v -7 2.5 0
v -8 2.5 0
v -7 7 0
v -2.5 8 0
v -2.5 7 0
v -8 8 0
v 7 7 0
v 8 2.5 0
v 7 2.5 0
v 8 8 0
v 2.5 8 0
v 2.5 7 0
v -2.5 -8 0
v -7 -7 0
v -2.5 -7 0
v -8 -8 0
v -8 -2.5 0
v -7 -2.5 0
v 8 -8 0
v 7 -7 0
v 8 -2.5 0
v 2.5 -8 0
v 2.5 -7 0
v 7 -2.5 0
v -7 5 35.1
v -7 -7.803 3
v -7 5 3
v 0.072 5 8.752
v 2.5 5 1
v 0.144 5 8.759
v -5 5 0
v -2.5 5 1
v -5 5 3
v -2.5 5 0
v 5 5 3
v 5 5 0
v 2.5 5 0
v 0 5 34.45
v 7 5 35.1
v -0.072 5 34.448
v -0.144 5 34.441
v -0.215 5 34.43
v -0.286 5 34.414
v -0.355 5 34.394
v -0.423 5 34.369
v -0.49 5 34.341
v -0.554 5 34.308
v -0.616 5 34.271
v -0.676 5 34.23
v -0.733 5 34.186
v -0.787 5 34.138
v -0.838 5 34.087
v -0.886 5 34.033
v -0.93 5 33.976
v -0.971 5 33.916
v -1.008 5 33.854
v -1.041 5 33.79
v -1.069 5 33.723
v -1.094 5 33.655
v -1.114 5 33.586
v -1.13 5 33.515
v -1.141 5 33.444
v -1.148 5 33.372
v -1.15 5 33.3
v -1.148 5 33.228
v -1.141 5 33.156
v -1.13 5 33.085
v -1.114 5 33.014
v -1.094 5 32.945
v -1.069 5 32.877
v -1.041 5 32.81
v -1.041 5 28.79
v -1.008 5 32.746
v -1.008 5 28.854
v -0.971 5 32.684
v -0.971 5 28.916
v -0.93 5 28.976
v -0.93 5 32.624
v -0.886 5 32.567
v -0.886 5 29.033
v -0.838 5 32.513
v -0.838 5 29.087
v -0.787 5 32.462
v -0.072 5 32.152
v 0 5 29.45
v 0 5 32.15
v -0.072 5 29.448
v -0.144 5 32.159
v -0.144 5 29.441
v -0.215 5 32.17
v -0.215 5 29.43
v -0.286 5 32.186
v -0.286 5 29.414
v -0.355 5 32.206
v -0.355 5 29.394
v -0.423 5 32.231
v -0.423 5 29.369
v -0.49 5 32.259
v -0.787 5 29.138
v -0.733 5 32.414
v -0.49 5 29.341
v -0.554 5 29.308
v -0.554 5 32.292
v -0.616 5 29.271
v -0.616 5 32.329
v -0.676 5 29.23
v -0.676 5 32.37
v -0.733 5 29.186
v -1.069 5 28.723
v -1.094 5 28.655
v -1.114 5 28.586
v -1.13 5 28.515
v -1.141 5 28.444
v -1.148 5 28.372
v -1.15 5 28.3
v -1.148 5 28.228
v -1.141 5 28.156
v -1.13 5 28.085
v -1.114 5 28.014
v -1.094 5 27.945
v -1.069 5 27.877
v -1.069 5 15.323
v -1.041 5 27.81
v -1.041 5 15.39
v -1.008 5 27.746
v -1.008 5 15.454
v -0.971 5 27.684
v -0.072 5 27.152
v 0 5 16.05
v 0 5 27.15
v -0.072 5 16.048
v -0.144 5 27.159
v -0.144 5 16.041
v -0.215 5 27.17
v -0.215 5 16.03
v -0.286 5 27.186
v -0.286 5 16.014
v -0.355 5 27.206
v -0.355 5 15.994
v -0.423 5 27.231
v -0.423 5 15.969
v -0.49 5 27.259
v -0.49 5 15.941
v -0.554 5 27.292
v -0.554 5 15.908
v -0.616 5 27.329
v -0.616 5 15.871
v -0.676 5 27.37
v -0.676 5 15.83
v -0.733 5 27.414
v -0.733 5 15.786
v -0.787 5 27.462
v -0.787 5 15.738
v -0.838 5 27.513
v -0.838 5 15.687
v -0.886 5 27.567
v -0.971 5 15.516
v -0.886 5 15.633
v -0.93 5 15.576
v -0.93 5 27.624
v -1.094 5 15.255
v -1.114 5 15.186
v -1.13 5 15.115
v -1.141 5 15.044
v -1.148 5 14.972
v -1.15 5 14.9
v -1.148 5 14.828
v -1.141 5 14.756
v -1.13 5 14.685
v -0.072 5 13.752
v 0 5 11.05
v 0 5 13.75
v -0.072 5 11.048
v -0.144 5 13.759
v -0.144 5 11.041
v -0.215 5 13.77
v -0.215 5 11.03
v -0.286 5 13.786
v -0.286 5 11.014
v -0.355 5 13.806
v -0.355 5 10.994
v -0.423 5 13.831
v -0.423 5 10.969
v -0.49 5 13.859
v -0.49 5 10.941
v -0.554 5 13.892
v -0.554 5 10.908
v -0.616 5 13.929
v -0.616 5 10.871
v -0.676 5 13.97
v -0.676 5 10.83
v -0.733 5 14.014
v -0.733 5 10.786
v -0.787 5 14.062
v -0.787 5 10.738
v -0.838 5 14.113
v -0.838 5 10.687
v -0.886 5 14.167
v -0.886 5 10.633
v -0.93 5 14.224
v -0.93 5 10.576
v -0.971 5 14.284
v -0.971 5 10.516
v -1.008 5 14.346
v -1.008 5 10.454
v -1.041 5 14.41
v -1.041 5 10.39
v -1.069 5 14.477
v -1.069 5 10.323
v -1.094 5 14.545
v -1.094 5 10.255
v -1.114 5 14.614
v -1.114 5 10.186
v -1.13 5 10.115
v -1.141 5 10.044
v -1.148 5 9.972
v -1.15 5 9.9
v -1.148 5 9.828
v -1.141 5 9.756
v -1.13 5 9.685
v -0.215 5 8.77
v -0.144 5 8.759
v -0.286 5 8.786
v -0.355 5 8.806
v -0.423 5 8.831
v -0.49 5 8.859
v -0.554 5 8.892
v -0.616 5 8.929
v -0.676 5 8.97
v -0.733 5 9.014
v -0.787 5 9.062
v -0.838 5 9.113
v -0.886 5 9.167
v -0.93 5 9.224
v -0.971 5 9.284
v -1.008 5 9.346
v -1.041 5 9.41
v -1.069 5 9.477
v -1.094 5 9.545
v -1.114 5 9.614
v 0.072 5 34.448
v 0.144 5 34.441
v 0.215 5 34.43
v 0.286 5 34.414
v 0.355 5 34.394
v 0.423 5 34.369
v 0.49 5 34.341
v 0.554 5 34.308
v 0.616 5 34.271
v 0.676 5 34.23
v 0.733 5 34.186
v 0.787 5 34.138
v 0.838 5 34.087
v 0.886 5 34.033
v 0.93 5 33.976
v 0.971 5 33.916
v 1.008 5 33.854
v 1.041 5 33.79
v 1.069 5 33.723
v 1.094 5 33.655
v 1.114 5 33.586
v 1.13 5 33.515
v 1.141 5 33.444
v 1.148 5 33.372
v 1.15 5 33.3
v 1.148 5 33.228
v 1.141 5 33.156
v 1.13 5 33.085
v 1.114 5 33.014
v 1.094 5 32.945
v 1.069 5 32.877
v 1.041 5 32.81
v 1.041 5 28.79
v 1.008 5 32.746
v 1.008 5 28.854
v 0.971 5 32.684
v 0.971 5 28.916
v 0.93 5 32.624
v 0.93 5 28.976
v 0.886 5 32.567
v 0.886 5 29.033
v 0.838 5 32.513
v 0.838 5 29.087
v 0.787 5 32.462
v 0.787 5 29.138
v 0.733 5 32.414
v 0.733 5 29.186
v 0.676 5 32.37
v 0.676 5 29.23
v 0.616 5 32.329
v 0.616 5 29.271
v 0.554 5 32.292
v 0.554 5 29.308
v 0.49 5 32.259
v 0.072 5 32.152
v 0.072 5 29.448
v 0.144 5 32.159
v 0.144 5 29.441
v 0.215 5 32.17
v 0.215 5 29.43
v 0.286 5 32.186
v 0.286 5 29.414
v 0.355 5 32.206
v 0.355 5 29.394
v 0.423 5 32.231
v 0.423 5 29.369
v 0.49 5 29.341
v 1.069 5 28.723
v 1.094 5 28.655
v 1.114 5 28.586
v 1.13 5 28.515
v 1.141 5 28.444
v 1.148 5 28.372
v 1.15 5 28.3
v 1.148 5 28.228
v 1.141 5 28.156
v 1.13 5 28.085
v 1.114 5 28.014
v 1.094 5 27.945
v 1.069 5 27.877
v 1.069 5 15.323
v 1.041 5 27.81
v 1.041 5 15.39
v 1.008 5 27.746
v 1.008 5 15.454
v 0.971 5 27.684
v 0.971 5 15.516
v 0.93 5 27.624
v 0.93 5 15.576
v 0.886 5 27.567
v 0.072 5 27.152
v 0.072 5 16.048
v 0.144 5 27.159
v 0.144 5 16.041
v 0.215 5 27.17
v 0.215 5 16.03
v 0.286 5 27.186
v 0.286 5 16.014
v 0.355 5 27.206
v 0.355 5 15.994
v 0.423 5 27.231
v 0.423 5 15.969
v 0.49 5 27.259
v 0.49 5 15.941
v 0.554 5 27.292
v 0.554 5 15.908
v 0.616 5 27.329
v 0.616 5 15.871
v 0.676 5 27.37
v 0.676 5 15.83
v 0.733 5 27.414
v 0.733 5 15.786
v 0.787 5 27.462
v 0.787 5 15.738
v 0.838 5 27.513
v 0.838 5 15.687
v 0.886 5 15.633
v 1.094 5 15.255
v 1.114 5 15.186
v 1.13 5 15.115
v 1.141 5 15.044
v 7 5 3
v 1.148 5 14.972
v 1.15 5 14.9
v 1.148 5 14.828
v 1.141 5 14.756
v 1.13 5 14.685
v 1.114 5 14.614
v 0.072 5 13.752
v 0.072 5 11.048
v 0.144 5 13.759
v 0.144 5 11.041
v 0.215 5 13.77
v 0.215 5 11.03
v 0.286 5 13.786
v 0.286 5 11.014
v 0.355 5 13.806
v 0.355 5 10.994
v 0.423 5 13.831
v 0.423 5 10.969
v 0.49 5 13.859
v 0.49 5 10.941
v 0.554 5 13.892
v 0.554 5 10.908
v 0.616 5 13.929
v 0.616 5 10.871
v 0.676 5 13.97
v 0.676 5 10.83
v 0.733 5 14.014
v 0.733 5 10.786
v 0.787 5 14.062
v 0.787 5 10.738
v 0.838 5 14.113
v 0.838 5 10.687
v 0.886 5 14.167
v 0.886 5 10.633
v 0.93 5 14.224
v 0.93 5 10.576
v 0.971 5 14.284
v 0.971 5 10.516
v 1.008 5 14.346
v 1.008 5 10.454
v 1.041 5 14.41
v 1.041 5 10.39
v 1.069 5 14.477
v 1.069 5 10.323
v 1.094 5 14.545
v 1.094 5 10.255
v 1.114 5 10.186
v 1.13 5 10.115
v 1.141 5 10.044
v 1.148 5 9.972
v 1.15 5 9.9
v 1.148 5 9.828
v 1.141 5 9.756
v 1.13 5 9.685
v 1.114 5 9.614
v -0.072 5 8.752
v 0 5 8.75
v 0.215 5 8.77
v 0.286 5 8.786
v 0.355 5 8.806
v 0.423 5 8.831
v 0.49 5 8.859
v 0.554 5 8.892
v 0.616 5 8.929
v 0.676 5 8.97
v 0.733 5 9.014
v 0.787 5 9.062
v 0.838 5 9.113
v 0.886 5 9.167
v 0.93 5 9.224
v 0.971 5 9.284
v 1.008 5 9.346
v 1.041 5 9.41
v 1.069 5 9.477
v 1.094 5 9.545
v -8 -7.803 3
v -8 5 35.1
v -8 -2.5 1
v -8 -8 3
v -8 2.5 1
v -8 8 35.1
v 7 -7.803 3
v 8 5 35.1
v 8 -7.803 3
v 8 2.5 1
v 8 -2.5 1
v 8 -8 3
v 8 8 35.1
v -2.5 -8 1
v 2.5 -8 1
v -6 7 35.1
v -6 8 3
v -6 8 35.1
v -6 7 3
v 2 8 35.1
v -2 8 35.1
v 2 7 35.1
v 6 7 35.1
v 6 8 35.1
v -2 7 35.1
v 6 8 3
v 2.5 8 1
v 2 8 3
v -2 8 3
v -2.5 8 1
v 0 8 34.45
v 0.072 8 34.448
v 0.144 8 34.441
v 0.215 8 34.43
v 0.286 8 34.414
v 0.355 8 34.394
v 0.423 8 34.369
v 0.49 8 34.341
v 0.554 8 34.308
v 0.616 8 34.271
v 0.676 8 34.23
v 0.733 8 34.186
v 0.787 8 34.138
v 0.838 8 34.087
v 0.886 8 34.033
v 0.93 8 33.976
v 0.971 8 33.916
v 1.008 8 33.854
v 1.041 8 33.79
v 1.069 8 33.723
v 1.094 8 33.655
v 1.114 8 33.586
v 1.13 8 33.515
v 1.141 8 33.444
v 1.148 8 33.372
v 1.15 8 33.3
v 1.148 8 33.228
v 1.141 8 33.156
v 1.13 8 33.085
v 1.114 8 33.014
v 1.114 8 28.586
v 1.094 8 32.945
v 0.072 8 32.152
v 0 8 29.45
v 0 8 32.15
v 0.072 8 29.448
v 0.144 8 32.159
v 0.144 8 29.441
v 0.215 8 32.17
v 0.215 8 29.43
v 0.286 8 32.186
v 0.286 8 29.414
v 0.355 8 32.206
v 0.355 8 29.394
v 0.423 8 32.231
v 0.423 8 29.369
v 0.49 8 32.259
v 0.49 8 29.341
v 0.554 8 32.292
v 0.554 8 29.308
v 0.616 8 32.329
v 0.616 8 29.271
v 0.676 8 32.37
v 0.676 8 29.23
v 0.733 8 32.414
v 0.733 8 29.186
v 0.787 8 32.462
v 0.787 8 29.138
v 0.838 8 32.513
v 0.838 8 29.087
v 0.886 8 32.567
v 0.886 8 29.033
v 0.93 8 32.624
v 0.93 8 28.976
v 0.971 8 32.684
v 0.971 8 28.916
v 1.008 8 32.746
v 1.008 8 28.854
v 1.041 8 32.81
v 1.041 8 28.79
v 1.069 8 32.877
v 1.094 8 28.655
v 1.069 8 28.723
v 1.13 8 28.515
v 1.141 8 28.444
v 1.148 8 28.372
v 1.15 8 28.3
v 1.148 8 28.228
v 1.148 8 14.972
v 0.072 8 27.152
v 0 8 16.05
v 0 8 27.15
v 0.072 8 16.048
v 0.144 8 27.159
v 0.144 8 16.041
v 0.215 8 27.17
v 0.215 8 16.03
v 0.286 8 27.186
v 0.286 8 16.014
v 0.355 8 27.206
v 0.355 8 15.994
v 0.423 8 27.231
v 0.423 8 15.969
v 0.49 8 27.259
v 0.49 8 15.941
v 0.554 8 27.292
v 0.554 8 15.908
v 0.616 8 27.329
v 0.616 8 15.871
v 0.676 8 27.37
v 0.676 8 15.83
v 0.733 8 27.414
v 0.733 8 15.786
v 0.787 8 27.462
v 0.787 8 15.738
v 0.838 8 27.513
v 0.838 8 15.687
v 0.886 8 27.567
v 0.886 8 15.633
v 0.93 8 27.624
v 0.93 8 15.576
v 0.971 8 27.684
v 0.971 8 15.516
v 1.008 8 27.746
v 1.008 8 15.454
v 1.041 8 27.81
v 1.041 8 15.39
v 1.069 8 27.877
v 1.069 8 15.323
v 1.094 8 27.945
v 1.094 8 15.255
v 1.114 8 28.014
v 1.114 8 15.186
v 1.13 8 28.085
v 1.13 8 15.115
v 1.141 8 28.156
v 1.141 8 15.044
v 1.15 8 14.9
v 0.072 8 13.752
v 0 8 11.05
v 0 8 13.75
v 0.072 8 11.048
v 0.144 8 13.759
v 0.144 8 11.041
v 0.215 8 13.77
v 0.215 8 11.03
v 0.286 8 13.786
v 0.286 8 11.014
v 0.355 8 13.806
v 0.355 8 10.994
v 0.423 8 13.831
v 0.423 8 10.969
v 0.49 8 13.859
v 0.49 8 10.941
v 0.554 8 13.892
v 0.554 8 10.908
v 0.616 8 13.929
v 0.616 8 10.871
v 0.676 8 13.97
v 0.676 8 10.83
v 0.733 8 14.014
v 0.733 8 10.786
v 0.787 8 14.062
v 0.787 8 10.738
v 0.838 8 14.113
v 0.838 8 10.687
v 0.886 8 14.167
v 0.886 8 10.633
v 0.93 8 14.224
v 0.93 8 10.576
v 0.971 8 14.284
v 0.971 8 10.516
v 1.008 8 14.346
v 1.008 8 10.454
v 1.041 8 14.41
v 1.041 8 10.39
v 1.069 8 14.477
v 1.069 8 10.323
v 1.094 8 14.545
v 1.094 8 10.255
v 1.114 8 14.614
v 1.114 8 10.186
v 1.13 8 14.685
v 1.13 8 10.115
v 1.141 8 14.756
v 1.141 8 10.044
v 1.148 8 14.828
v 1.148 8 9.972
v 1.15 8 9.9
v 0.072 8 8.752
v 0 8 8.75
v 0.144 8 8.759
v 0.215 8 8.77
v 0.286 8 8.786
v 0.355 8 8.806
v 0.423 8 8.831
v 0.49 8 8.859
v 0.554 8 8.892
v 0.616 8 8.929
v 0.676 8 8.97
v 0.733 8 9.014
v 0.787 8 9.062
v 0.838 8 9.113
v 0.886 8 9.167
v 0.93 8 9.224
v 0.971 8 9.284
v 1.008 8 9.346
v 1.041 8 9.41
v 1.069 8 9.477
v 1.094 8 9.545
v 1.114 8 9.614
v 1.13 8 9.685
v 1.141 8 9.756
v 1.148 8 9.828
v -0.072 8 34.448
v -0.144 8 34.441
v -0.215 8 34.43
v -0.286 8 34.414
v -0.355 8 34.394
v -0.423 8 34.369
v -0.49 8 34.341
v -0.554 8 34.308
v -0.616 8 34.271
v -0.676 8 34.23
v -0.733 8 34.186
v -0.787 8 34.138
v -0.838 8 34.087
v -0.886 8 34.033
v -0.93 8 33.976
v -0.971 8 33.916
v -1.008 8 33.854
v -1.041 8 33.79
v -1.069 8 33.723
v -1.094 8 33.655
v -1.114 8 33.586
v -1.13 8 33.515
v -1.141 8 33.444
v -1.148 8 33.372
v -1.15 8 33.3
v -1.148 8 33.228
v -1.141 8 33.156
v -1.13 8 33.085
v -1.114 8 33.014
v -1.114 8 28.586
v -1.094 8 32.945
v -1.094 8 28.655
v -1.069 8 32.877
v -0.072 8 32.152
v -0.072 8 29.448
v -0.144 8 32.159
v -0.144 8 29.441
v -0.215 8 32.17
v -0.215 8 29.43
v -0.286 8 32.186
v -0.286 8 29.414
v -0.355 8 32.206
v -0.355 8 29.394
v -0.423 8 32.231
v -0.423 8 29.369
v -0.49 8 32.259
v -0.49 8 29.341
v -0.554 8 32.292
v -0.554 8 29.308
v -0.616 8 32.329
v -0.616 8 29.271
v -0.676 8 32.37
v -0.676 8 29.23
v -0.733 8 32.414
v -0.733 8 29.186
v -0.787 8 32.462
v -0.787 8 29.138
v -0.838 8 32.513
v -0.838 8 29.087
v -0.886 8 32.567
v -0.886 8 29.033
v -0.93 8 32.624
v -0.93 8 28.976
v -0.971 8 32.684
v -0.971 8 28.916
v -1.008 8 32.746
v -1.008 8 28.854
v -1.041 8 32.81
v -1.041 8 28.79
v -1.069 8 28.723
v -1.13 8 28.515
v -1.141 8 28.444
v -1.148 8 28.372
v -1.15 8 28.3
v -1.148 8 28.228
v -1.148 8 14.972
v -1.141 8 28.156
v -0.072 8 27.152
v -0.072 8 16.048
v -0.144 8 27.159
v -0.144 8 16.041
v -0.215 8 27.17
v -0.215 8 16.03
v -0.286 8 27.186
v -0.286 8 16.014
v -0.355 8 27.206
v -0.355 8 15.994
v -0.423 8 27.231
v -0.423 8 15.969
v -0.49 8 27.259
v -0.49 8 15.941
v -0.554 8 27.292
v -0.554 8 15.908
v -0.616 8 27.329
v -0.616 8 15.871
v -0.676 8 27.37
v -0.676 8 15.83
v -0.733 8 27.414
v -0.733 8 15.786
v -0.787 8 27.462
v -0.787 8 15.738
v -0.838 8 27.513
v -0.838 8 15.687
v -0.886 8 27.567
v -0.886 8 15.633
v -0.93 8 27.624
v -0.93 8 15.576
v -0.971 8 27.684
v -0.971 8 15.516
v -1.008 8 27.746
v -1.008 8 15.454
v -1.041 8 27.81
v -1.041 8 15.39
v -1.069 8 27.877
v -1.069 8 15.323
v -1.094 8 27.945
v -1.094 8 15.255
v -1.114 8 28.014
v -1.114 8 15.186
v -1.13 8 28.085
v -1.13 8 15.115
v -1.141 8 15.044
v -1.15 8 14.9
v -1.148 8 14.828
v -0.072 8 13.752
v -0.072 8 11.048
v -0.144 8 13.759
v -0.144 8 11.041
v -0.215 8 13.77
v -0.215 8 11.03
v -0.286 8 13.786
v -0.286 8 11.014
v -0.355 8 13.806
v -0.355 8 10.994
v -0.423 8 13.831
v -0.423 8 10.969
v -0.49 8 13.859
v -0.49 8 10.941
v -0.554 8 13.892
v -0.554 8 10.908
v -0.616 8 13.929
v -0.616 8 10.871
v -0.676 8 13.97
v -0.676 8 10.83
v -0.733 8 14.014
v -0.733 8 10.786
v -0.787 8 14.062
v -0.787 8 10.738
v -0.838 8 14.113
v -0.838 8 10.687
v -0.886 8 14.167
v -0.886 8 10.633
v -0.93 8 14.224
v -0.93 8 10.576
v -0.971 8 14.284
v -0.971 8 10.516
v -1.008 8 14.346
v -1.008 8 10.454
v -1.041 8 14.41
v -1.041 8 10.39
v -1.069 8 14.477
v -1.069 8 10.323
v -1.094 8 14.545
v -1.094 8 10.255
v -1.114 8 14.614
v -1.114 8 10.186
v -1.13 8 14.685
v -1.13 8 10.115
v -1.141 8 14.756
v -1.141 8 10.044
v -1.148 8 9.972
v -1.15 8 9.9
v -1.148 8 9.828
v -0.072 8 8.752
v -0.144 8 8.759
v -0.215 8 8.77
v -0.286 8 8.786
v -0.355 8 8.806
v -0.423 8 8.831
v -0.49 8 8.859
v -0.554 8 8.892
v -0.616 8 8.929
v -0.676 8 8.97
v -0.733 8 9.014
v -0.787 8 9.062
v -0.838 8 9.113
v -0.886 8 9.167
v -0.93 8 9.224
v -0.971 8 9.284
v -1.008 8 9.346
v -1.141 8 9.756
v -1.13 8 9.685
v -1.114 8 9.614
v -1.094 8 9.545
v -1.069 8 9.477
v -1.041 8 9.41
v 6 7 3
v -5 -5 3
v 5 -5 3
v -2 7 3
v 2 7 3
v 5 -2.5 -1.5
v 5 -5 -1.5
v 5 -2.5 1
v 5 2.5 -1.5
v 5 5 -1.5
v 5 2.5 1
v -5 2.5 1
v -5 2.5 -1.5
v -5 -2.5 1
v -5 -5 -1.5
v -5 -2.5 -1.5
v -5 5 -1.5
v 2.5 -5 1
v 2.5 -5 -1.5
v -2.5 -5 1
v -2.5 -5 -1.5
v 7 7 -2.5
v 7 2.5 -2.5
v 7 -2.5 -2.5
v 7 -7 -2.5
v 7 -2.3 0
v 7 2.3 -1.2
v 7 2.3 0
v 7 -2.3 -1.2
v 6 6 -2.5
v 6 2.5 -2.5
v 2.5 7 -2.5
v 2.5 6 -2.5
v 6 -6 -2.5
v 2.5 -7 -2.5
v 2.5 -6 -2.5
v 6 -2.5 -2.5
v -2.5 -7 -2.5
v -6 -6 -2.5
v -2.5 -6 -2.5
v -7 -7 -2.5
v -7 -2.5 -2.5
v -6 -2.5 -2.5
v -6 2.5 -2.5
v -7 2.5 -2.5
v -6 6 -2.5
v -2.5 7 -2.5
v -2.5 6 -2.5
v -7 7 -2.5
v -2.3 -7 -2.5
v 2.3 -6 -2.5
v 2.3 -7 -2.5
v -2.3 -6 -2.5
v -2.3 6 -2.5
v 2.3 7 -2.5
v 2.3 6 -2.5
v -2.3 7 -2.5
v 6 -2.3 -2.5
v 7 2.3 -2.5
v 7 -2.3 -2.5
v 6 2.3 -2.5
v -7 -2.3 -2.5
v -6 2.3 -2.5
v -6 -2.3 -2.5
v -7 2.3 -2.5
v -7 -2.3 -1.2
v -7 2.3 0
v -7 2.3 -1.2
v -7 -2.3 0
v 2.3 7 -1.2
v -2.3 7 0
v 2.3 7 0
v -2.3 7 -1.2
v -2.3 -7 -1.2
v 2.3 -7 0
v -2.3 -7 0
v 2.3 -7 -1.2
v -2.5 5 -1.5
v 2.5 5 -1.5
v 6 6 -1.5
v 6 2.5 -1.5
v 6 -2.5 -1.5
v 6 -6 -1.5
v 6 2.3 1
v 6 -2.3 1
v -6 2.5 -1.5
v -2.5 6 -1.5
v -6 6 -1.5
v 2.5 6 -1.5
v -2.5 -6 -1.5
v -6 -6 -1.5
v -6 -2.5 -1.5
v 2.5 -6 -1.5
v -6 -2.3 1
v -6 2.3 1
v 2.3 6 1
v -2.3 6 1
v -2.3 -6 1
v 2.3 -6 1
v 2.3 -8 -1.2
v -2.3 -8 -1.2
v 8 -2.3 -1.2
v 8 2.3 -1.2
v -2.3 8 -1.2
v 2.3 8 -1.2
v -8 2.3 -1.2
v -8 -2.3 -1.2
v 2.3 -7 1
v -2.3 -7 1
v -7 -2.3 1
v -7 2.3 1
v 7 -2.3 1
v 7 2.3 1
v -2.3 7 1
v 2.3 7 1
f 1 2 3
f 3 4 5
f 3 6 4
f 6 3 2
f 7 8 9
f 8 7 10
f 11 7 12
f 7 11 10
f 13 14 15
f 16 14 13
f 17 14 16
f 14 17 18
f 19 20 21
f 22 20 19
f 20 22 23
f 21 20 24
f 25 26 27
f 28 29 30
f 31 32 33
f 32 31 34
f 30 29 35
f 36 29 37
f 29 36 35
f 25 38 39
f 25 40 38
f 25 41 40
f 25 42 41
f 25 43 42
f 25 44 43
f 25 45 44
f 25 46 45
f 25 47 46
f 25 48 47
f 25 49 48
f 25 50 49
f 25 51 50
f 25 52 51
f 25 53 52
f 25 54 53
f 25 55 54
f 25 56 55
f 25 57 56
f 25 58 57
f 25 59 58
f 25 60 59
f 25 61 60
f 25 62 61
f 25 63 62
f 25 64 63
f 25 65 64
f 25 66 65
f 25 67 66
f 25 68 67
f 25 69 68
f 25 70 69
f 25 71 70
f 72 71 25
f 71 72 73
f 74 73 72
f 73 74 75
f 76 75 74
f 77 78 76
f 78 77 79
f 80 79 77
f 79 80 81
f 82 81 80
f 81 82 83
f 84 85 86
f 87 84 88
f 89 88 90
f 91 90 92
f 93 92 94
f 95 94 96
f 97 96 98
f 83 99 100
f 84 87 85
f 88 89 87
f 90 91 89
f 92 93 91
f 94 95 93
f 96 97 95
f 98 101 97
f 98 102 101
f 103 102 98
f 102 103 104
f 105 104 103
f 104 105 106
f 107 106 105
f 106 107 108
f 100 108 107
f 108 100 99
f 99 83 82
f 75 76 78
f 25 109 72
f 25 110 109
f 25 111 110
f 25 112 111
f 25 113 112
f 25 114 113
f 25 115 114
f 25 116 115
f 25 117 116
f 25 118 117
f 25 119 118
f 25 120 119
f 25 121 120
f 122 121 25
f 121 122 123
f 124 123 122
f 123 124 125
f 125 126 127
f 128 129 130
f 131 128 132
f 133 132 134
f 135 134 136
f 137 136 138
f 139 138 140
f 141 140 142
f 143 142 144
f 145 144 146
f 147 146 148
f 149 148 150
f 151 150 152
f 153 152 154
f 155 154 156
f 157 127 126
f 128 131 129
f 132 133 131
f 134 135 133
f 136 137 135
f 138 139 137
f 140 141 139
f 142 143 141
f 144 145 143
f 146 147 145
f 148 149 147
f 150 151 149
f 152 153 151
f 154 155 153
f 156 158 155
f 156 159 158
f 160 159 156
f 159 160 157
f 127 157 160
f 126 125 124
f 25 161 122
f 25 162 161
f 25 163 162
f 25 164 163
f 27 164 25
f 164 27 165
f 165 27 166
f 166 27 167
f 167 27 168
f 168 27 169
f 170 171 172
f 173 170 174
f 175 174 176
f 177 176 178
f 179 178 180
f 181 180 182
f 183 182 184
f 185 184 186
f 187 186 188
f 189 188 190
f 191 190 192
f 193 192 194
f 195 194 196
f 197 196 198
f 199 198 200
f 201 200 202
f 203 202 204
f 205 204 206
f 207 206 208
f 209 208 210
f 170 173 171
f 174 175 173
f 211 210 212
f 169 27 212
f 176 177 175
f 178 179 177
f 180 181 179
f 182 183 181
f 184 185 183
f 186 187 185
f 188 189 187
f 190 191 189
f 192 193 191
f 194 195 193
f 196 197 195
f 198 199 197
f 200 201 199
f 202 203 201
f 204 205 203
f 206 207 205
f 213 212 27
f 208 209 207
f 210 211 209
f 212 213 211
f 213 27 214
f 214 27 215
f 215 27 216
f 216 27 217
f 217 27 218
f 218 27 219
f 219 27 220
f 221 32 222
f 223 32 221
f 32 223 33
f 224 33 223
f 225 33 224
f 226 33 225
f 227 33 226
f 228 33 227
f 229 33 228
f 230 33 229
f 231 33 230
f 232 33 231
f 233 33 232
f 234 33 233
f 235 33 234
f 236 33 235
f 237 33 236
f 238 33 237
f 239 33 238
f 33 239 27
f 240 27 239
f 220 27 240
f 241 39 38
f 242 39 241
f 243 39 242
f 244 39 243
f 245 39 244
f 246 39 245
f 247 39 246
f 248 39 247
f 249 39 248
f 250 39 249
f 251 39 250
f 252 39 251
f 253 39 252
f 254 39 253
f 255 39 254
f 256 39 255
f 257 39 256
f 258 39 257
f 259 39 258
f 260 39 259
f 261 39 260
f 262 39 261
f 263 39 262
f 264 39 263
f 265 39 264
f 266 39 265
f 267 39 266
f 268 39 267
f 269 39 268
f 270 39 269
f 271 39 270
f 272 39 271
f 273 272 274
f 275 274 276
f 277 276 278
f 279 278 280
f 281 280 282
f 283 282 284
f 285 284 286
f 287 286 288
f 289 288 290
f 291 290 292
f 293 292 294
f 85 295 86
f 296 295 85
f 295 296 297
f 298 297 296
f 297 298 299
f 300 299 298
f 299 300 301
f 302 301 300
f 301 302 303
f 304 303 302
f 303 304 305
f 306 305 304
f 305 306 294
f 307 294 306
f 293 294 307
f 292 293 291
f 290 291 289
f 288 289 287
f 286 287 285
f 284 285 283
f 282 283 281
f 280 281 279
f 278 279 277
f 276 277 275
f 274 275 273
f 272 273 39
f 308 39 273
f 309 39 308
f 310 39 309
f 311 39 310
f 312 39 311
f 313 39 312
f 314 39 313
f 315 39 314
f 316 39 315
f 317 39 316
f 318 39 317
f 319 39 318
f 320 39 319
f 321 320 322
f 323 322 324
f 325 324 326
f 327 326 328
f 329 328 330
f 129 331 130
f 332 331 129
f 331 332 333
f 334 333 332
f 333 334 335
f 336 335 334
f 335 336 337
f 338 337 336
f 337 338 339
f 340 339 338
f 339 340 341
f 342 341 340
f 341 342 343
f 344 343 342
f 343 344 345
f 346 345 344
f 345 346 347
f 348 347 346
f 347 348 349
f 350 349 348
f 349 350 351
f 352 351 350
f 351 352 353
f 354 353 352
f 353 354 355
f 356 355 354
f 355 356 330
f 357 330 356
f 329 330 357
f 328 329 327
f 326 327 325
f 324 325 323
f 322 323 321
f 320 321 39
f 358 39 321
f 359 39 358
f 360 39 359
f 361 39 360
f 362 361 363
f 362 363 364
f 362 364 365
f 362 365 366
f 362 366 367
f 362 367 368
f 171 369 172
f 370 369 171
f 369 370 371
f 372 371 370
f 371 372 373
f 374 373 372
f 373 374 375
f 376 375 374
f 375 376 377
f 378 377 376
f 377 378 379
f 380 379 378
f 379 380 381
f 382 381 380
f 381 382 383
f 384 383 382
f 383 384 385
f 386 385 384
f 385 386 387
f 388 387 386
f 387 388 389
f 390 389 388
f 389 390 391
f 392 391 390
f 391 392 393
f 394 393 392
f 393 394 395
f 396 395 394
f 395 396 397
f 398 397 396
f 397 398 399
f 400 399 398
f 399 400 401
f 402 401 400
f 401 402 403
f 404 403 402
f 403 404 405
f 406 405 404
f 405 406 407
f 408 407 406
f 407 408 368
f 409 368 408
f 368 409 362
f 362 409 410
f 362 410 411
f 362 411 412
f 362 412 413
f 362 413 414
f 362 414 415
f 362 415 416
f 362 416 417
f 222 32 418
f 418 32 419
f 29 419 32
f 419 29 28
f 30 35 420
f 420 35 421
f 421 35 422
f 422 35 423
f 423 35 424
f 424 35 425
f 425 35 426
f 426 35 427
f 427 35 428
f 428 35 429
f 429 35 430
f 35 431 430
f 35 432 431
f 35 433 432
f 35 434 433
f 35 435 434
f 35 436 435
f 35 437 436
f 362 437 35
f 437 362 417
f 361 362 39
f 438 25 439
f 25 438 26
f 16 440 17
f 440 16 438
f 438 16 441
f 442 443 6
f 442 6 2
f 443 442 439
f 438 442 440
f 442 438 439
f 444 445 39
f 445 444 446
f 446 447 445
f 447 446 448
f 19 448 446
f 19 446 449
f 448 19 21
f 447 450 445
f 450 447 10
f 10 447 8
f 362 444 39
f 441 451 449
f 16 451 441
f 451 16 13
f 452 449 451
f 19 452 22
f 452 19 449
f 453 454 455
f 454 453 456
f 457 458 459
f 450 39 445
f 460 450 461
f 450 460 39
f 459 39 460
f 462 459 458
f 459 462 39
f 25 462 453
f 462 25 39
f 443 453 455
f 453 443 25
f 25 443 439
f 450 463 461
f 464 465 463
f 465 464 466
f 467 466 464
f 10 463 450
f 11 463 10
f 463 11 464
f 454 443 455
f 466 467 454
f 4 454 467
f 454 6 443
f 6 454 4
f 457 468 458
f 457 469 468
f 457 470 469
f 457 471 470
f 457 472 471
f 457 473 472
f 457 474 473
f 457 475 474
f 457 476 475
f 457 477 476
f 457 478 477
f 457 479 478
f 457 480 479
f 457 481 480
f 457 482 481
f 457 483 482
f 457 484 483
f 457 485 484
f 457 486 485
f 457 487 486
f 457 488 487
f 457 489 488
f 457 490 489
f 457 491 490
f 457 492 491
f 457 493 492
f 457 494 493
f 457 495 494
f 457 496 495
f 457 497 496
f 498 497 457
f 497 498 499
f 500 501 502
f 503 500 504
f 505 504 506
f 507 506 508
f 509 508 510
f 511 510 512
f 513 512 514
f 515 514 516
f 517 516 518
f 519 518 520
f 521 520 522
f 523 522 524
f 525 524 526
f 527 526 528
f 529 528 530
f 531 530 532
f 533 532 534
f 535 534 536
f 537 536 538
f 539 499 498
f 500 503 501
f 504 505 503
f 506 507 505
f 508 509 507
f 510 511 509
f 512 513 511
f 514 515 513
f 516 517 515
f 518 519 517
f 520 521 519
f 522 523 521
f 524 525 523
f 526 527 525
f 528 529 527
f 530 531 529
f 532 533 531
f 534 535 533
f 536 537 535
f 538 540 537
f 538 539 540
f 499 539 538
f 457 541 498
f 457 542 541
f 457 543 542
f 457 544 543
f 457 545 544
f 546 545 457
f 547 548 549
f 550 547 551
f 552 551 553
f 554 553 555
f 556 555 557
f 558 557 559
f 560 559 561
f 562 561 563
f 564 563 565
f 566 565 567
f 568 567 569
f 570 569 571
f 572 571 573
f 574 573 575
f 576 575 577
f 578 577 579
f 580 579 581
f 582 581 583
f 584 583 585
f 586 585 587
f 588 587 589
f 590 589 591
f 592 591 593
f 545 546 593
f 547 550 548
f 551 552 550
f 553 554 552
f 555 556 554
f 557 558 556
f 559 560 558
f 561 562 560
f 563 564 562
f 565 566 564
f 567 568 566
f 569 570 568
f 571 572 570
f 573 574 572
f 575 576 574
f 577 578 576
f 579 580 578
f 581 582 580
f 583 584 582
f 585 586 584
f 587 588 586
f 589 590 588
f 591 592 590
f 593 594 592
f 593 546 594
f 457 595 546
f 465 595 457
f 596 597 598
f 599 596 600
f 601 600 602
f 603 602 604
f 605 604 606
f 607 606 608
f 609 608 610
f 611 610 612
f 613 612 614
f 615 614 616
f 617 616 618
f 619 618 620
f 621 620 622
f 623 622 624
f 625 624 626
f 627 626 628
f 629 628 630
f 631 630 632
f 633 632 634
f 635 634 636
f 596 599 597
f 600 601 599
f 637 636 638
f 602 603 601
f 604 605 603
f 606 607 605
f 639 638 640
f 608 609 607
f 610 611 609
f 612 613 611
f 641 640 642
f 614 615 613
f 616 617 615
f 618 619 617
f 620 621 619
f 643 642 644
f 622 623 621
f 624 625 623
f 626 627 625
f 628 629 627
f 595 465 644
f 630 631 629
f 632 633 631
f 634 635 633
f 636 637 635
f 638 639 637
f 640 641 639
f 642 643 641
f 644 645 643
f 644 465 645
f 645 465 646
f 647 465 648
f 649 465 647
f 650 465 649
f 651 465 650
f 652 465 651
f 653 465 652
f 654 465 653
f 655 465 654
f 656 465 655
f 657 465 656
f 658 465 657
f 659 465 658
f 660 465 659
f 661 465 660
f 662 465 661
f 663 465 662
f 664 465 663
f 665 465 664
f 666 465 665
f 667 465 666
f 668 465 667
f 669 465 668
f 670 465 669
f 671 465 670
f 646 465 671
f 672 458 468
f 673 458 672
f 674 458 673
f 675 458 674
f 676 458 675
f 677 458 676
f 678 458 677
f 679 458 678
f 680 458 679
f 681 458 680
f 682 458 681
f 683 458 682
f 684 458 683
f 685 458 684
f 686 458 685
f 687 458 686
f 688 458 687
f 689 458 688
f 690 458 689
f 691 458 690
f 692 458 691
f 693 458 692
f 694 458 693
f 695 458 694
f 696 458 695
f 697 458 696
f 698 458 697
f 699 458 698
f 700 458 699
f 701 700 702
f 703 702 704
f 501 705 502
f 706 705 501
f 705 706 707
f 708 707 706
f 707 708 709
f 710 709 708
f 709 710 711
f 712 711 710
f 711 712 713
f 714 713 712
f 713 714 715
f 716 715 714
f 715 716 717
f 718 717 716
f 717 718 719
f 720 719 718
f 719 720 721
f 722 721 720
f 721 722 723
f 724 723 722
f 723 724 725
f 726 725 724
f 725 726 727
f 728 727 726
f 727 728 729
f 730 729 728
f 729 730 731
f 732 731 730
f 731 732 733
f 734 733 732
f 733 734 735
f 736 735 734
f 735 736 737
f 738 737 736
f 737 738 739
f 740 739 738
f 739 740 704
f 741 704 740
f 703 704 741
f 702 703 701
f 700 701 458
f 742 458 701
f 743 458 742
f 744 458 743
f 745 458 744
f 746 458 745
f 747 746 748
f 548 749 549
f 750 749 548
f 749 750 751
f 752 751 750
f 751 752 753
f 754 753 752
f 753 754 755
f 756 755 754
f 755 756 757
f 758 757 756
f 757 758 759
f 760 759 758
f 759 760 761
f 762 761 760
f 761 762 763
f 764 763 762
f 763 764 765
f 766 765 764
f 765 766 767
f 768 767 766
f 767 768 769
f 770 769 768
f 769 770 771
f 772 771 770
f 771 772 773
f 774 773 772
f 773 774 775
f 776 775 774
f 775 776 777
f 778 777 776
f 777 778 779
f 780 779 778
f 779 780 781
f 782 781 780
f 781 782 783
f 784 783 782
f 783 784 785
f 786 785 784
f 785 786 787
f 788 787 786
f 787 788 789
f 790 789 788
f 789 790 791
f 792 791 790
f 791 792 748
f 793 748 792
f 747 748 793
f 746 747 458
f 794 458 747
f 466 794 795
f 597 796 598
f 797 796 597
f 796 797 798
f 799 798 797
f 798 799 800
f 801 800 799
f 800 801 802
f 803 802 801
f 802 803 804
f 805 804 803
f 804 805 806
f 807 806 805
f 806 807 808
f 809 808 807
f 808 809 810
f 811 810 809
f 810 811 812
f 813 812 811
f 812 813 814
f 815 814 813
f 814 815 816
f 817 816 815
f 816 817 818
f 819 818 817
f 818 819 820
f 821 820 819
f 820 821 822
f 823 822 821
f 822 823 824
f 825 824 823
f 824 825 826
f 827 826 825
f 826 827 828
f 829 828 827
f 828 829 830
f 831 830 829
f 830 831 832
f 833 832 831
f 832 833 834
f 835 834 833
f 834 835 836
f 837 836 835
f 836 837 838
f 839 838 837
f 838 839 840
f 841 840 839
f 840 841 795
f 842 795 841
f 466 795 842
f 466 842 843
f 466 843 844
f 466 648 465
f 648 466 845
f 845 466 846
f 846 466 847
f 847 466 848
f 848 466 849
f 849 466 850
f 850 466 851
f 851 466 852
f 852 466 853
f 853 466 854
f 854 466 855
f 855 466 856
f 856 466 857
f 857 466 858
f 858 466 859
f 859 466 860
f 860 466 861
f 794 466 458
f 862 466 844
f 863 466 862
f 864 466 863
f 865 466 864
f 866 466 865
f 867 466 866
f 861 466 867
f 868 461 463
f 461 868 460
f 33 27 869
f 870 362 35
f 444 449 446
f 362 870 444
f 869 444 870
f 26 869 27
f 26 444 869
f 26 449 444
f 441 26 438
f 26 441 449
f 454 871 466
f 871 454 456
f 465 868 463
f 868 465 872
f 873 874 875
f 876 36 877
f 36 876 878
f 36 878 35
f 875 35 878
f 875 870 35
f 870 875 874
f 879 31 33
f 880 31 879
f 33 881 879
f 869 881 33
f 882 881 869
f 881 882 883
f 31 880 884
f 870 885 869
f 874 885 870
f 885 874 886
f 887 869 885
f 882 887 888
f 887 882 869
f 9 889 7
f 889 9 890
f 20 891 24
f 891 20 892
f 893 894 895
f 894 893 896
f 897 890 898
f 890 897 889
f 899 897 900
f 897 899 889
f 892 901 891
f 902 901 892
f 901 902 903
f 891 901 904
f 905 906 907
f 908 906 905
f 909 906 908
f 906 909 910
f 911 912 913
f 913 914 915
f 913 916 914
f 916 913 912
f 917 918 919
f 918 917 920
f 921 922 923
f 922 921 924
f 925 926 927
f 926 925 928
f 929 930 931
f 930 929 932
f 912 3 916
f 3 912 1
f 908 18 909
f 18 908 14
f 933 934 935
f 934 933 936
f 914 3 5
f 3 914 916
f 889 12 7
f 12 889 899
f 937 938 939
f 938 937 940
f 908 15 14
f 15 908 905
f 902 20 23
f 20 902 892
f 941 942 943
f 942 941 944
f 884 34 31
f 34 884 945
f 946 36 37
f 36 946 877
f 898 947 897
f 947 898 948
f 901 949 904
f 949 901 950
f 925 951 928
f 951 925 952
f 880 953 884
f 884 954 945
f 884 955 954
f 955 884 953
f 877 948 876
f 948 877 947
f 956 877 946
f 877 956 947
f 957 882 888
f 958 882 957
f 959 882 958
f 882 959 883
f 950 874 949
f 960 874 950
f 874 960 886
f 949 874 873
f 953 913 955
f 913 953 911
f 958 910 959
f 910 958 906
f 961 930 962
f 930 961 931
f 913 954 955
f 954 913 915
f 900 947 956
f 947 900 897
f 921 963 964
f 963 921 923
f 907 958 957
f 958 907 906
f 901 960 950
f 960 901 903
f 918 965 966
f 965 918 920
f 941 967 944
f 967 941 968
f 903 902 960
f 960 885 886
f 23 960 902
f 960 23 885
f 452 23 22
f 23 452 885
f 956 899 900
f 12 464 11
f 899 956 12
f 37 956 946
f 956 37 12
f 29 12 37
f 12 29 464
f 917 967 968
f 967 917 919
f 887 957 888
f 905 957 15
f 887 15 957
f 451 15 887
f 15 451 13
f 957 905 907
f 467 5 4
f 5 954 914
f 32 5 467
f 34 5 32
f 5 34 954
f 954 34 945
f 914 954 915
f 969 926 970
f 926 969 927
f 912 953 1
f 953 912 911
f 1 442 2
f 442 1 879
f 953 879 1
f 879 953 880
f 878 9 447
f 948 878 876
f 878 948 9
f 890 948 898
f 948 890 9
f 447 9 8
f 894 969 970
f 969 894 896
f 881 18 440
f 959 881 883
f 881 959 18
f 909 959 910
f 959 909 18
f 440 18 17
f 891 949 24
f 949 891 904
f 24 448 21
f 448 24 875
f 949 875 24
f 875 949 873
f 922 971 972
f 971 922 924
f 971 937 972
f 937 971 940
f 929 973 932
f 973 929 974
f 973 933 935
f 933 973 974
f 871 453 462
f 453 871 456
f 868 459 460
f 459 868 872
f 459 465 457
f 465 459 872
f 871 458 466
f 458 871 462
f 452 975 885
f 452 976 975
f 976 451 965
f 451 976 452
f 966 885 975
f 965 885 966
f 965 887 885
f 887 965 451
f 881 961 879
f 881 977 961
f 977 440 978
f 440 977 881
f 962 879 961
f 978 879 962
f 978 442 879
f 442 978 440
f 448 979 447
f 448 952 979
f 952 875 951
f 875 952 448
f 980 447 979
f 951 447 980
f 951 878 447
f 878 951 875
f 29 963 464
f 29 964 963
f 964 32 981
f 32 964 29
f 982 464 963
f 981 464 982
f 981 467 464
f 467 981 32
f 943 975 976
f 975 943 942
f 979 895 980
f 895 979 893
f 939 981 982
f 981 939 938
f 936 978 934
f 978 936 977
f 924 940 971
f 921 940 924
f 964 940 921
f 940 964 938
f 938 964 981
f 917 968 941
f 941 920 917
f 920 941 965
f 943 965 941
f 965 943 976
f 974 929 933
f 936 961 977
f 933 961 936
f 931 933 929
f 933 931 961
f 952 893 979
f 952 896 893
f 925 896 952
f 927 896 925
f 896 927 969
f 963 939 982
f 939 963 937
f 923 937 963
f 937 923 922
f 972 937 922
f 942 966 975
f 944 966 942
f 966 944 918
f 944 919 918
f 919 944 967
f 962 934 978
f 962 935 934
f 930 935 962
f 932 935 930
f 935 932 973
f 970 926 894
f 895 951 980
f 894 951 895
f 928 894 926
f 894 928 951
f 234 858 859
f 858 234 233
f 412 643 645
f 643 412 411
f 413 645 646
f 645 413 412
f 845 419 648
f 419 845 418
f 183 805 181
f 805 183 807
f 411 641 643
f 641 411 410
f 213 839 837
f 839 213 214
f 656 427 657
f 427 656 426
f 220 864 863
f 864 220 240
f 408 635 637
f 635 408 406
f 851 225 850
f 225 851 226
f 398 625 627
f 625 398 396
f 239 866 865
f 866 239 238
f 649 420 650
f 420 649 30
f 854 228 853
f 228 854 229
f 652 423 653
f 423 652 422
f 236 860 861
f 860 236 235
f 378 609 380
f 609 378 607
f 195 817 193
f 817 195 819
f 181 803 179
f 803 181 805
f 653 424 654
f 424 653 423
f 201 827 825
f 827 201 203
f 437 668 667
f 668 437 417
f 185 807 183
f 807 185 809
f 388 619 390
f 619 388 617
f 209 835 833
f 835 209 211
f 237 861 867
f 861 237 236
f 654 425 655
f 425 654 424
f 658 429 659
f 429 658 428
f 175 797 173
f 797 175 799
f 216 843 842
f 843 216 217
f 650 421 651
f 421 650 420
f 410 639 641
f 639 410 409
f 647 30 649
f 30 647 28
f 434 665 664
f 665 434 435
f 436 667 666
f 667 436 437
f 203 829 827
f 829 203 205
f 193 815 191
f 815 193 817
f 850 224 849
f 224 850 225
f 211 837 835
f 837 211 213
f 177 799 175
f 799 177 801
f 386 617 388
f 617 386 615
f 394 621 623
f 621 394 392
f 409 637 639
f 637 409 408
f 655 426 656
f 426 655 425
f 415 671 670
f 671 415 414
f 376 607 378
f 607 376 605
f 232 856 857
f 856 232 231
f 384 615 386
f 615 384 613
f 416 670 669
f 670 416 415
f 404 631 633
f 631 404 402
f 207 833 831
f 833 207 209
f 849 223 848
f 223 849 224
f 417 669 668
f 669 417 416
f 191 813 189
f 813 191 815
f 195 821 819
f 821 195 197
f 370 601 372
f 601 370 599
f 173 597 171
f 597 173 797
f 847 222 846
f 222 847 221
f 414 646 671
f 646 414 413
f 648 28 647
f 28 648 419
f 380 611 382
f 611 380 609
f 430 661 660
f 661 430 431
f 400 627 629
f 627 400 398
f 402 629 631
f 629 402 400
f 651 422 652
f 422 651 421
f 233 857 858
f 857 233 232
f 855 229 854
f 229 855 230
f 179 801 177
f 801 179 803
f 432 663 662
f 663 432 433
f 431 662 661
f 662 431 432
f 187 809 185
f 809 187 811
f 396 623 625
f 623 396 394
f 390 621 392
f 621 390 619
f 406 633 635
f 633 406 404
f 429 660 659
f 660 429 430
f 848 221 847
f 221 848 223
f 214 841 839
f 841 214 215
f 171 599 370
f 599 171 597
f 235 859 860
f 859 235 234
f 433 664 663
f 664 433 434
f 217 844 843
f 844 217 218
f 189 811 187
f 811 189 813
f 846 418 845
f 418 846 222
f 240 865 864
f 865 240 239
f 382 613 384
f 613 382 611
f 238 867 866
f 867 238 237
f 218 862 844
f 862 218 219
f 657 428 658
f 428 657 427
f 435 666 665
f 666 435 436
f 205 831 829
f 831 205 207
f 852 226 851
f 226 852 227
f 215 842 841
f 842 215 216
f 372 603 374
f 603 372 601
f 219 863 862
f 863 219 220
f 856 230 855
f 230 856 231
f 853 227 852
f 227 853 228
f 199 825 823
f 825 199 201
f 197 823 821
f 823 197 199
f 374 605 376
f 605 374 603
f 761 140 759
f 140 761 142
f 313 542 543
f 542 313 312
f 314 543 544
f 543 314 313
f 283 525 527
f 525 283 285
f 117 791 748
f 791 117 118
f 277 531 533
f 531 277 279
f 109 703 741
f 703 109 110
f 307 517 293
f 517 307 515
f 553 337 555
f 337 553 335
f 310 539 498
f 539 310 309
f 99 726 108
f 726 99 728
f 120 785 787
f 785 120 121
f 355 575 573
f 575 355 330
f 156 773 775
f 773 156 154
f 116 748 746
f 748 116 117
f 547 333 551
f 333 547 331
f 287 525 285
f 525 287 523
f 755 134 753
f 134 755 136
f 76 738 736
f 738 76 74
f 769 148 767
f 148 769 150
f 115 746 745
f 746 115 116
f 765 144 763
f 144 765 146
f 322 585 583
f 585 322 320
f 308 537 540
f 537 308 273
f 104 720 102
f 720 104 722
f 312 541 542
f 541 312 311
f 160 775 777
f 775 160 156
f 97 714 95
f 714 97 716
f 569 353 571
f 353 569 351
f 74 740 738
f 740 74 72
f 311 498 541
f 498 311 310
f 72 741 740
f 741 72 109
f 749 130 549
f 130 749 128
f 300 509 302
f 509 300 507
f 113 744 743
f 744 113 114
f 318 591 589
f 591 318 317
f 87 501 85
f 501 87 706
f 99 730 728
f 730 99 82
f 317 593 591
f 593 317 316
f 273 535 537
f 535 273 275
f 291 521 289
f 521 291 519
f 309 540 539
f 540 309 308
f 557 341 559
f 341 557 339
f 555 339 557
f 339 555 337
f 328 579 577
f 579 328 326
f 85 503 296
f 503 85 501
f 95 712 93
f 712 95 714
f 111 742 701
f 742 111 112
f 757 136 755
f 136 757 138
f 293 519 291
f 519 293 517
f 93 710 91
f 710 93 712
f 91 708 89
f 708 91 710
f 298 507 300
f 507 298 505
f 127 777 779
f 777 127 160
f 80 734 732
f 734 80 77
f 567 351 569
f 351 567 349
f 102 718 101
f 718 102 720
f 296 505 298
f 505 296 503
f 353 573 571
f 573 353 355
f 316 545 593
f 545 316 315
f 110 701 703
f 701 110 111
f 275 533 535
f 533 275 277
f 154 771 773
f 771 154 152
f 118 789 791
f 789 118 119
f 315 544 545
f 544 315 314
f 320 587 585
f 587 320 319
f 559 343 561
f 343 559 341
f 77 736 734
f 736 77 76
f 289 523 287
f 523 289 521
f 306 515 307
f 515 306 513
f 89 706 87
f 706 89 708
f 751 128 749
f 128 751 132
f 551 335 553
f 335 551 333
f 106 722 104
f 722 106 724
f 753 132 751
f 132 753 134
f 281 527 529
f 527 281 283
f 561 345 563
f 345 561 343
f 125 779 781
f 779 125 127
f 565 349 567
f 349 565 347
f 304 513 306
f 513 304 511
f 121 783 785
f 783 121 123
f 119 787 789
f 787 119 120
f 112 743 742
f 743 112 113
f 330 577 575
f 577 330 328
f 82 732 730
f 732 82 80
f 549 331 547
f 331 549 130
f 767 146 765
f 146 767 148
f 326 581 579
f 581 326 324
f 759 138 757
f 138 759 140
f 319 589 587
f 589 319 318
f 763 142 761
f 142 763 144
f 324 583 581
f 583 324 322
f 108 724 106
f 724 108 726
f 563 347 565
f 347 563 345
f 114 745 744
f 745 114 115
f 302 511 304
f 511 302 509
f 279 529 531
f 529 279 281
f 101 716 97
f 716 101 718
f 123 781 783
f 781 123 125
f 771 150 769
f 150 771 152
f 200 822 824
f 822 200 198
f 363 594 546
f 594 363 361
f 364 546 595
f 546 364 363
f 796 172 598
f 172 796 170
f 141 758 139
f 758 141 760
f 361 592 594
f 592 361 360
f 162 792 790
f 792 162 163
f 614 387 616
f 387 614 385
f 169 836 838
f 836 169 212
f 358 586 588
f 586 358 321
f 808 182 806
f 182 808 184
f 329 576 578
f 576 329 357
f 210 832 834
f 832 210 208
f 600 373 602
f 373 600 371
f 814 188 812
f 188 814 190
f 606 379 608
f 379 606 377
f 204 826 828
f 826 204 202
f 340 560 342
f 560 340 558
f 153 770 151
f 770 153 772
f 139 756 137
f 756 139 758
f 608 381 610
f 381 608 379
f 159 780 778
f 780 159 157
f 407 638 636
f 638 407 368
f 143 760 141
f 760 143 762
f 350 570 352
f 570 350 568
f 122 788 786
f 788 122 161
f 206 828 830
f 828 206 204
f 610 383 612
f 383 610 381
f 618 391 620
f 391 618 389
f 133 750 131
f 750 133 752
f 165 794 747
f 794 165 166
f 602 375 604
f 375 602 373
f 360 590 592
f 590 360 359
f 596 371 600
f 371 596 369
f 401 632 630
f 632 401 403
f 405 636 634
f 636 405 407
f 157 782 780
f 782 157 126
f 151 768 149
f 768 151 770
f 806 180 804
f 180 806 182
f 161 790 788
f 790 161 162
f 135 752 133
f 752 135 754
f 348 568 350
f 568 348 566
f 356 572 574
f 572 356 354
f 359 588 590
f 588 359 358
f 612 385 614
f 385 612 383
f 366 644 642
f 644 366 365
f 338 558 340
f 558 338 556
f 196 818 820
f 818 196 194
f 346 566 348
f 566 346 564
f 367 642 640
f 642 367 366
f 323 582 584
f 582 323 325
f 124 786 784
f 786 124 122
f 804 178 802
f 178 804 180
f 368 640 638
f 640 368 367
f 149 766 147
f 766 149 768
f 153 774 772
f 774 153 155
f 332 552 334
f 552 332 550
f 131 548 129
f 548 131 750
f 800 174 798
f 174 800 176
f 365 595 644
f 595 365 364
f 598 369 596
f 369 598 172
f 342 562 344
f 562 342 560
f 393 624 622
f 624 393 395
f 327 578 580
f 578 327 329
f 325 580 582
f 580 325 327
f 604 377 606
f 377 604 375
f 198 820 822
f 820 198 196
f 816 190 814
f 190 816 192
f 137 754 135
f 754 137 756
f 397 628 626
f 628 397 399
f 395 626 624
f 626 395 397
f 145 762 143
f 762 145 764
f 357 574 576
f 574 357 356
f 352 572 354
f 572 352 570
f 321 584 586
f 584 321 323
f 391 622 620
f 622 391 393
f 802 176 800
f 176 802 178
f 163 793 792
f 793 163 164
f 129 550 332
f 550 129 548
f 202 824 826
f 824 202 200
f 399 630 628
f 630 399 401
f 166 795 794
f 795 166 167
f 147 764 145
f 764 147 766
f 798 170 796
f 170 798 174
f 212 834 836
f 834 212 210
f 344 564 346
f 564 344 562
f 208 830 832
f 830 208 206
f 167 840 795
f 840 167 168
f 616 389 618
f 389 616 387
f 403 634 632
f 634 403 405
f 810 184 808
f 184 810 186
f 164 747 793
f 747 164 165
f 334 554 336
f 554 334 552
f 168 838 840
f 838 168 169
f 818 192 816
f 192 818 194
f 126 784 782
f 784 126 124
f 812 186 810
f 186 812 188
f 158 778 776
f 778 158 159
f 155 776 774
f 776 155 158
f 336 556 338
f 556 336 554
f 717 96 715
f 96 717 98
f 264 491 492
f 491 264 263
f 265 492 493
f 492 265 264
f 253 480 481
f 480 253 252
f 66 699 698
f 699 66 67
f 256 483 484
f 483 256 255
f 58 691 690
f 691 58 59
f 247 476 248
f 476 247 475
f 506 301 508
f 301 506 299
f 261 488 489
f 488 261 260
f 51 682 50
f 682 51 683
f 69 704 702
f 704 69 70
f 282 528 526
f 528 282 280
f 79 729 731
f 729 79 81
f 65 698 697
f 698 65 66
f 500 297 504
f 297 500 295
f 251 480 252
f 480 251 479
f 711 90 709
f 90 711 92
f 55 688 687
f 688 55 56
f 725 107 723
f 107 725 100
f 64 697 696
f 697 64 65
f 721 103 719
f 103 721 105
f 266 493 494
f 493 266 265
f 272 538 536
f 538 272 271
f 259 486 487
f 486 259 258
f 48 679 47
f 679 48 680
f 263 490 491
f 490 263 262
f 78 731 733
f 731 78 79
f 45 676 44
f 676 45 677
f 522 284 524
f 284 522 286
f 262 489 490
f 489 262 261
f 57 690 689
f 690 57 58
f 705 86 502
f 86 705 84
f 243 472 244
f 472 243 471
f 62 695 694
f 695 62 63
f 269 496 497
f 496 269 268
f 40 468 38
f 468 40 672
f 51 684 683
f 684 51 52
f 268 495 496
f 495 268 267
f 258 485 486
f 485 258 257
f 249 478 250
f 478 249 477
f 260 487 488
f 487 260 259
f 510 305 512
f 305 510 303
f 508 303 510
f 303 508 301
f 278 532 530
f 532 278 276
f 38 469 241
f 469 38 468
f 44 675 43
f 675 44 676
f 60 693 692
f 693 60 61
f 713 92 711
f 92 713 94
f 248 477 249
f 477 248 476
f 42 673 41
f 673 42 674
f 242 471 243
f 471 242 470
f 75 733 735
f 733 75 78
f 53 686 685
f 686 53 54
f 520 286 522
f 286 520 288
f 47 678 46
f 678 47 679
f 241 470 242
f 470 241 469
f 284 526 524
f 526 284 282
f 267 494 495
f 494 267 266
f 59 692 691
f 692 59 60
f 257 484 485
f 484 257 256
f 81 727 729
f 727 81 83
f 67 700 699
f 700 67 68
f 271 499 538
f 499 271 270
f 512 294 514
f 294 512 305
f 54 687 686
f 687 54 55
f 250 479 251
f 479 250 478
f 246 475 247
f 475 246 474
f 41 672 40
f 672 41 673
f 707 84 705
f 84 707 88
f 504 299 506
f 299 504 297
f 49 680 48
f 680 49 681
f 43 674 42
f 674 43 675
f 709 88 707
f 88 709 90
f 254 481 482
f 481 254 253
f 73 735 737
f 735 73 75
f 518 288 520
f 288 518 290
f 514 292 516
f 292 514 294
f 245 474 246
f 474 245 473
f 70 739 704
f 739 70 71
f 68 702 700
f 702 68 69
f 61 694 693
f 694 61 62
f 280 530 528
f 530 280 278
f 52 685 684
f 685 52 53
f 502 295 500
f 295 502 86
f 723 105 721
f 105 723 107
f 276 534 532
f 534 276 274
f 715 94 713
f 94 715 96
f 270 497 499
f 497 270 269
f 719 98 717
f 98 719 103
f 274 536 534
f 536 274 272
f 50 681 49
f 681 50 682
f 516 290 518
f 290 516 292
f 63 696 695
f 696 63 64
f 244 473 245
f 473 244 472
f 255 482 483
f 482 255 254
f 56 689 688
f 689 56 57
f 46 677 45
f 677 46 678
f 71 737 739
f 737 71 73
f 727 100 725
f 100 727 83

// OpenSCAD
$fn=100;

sw_x = 14;

sw_out_x = sw_x + 2;
sw_out_z = 3;
sw_out_cutin_x = sw_x - 4;

sw_plate_z = 1.2;
sw_plate_low_z = 2.5;
sw_plate_low_cutin_x = sw_x - 2;
sw_plate_low_cutin_z = 1;

js_y = 2;
js_down_z = 11.85;
js_up_z = 10.25;
js_down_hole_z = 9.95;
js_up_hole_z = 8.45;
js_offset0_z = 5 + 3;
js_offset1_z = js_offset0_z + 5;
js_z = js_offset1_z + js_down_z + js_up_z;
//js_plate_low_z = sw_plate_low_z - sw_plate_low_cutin_z;
js_hole_d = 2.3;

sw_snap_x = 5;
sw_snap_y = 1;
sw_snap_z = sw_plate_low_z - sw_plate_z;

space_x = 17;

//plate_r = 1;
//plate_h = 0.5;

//module plate(x, y, z, r = plate_r) {
//    minkowski() {
//        cube([x - r * 2, y - r * 2, z - plate_h], true);
//        cylinder(h=plate_h, r = r, center=true);
//    }
//}

//%plate(10, 10, 2);

module prism(x, y, z){
  polyhedron(
             points=[[-x/2,0,0], [x/2,0,0], [x/2,0,z], [-x/2,0,z], [-x/2,-y,z], [x/2,-y,z]],
             faces=[[0,1,2,3],[5,4,3,2],[0,4,5,1],[0,3,4],[5,2,1]]
  );
}

//for(i = [0:1]) translate([space_x * i, 0, 0]) 
difference() {
  union() {
    //    joystick mount plate
    translate([0, sw_x / 2 - 1, 0]) {
      difference() {
        translate([0, 0, js_z / 2]) cube([sw_out_x, js_y, js_z], true);
        
        // z hole alps
//        alps_down_hole_z = 8.35;
//        alps_up_hole_z = 7.9;
//        alps_hole_d = 2;
//        alps_hole_space = 2.5;
//        alps_mount_space_x = 12.65 / 2;
//        alps_mount_space_z = 10 / 2;
//        alps_mount_hole_d = 2.5;
//        alps_sw_hole_space_z = 4.5 / 2;
//        alps_sw_hole_space_x = 6.5 / 2;
//        // output pin
//        for(i = [-1:1]) {
//            translate([i * alps_hole_space, 0, js_offset_z + js_down_z + alps_down_hole_z + sw_out_z]) rotate([90, 0, 0]) cylinder(h = js_y, d = alps_hole_d, center = true);
//        }
//        for(i = [-1:1]) {
//            translate([alps_down_hole_z, 0, js_offset_z + js_down_z + sw_out_z + i * alps_hole_space]) rotate([90, 0, 0]) cylinder(h = js_y, d = alps_hole_d, center = true);
//        }
//        // switch pin
//        for(i = [-1,1], j = [-1,1]) { 
//        translate([i * alps_sw_hole_space_x, 0, js_offset_z + js_down_z + sw_out_z + j * alps_sw_hole_space_z - alps_up_hole_z]) rotate([90, 0, 0]) cylinder(h = js_y, d = alps_hole_d, center = true);
//        }
//        // mount pin
//        for(i = [-1,1], j = [-1,1]) { 
//        translate([i * alps_mount_space_x, 0, js_offset_z + js_down_z + sw_out_z + j * alps_mount_space_z]) rotate([90, 0, 0]) cylinder(h = js_y, d = alps_mount_hole_d, center = true);
//        }
      }
    }

    // joystick mount plate font strength
    js_side_y = sw_x;
    js_side_x = (sw_out_x - sw_x) / 2;
    difference() {
        for(i = [-1,1]) translate([i * (sw_x + js_side_x) / 2, -js_side_y / 2 - js_y, 0]) rotate([-90, 0, 0]) prism(js_side_x, js_z, js_side_y); 
        translate([0, -sw_out_x, 0]) cube([sw_out_x, sw_out_x, sw_out_x], true);
    }
    // joystick mount plate back strength
    js_back_y = 2;
    for(i = [-1, 1]) translate([i * sw_x / 2, (sw_out_x - js_back_y) / 2, js_z / 2]) cube([js_back_y, js_back_y, js_z], true);
    translate([0, (sw_out_x - js_back_y) / 2, js_z / 2]) cube([js_back_y * 2, js_back_y , js_z], true);

    
    //    z plate upper
    translate([0, 0, sw_out_z / 2]) difference() {
      cube([sw_out_x, sw_out_x, sw_out_z], true);
      cube([sw_out_cutin_x, sw_out_cutin_x, sw_out_z], true);
    }
    
    //    z plate, plate lower
    translate([0, 0, -sw_plate_low_z / 2]) difference() {
      cube([sw_x, sw_x, sw_plate_low_z], true);
      cube([sw_out_cutin_x, sw_out_cutin_x, sw_plate_low_z], true);
      translate([0, 0, sw_plate_low_cutin_z / 2 -sw_plate_low_z / 2]) cube([sw_plate_low_cutin_x, sw_plate_low_cutin_x, sw_plate_low_cutin_z], true);
    }

    // snap
    for(i = [0:4]) {
      rotate([0, 0, 90 * i]) translate([0, -sw_x / 2, -sw_snap_z - sw_plate_z]) prism(sw_snap_x, sw_snap_y, sw_snap_z);
    }
  }

  // plate upper snap cut
  sw_plate_up_snap_cut_y = (sw_out_x - sw_x) / 2;
  sw_plate_up_snap_cut_z = 1;
  for(i = [0:4]) {
  rotate([0, 0, 90 * i]) translate([0, -sw_out_x / 2 + sw_plate_up_snap_cut_y / 2, sw_plate_up_snap_cut_z / 2]) cube([sw_snap_x, sw_plate_up_snap_cut_y, sw_plate_up_snap_cut_z], true);
  }

  // snap cut
  sw_snap_cut_x = 0.2;
  sw_snap_cut_z = sw_plate_low_z + sw_plate_up_snap_cut_z;
  for(i = [-1, +1], j = [0, 1]) {
    rotate([0, 0, j * 90]) {
      translate([i * sw_snap_x / 2 - i * sw_snap_cut_x / 2, 0, - sw_plate_low_z + sw_snap_cut_z / 2]) cube([sw_snap_cut_x, sw_out_x, sw_snap_cut_z], true);
      translate([0, 0,  - sw_plate_low_z + sw_snap_cut_z / 2]) cube([sw_snap_x, sw_plate_low_cutin_x, sw_snap_cut_z], true);
    }
  }
  
    // plate z hole
    for (i = [js_offset0_z, js_offset1_z], j = [-js_down_hole_z, js_up_hole_z]) {
        translate([0, sw_x / 2 - 1, i + j + js_down_z]) rotate([90, 0, 0]) cylinder(h = 5, d = js_hole_d, center = true);
    }
}

// connection
*for(i = [0:2]) translate([space_x * (i + 0.5), sw_x / 2 - 1, js_z / 2]) rotate([0, 90, 0]) cylinder(d = 2, h = 1, center = true);
